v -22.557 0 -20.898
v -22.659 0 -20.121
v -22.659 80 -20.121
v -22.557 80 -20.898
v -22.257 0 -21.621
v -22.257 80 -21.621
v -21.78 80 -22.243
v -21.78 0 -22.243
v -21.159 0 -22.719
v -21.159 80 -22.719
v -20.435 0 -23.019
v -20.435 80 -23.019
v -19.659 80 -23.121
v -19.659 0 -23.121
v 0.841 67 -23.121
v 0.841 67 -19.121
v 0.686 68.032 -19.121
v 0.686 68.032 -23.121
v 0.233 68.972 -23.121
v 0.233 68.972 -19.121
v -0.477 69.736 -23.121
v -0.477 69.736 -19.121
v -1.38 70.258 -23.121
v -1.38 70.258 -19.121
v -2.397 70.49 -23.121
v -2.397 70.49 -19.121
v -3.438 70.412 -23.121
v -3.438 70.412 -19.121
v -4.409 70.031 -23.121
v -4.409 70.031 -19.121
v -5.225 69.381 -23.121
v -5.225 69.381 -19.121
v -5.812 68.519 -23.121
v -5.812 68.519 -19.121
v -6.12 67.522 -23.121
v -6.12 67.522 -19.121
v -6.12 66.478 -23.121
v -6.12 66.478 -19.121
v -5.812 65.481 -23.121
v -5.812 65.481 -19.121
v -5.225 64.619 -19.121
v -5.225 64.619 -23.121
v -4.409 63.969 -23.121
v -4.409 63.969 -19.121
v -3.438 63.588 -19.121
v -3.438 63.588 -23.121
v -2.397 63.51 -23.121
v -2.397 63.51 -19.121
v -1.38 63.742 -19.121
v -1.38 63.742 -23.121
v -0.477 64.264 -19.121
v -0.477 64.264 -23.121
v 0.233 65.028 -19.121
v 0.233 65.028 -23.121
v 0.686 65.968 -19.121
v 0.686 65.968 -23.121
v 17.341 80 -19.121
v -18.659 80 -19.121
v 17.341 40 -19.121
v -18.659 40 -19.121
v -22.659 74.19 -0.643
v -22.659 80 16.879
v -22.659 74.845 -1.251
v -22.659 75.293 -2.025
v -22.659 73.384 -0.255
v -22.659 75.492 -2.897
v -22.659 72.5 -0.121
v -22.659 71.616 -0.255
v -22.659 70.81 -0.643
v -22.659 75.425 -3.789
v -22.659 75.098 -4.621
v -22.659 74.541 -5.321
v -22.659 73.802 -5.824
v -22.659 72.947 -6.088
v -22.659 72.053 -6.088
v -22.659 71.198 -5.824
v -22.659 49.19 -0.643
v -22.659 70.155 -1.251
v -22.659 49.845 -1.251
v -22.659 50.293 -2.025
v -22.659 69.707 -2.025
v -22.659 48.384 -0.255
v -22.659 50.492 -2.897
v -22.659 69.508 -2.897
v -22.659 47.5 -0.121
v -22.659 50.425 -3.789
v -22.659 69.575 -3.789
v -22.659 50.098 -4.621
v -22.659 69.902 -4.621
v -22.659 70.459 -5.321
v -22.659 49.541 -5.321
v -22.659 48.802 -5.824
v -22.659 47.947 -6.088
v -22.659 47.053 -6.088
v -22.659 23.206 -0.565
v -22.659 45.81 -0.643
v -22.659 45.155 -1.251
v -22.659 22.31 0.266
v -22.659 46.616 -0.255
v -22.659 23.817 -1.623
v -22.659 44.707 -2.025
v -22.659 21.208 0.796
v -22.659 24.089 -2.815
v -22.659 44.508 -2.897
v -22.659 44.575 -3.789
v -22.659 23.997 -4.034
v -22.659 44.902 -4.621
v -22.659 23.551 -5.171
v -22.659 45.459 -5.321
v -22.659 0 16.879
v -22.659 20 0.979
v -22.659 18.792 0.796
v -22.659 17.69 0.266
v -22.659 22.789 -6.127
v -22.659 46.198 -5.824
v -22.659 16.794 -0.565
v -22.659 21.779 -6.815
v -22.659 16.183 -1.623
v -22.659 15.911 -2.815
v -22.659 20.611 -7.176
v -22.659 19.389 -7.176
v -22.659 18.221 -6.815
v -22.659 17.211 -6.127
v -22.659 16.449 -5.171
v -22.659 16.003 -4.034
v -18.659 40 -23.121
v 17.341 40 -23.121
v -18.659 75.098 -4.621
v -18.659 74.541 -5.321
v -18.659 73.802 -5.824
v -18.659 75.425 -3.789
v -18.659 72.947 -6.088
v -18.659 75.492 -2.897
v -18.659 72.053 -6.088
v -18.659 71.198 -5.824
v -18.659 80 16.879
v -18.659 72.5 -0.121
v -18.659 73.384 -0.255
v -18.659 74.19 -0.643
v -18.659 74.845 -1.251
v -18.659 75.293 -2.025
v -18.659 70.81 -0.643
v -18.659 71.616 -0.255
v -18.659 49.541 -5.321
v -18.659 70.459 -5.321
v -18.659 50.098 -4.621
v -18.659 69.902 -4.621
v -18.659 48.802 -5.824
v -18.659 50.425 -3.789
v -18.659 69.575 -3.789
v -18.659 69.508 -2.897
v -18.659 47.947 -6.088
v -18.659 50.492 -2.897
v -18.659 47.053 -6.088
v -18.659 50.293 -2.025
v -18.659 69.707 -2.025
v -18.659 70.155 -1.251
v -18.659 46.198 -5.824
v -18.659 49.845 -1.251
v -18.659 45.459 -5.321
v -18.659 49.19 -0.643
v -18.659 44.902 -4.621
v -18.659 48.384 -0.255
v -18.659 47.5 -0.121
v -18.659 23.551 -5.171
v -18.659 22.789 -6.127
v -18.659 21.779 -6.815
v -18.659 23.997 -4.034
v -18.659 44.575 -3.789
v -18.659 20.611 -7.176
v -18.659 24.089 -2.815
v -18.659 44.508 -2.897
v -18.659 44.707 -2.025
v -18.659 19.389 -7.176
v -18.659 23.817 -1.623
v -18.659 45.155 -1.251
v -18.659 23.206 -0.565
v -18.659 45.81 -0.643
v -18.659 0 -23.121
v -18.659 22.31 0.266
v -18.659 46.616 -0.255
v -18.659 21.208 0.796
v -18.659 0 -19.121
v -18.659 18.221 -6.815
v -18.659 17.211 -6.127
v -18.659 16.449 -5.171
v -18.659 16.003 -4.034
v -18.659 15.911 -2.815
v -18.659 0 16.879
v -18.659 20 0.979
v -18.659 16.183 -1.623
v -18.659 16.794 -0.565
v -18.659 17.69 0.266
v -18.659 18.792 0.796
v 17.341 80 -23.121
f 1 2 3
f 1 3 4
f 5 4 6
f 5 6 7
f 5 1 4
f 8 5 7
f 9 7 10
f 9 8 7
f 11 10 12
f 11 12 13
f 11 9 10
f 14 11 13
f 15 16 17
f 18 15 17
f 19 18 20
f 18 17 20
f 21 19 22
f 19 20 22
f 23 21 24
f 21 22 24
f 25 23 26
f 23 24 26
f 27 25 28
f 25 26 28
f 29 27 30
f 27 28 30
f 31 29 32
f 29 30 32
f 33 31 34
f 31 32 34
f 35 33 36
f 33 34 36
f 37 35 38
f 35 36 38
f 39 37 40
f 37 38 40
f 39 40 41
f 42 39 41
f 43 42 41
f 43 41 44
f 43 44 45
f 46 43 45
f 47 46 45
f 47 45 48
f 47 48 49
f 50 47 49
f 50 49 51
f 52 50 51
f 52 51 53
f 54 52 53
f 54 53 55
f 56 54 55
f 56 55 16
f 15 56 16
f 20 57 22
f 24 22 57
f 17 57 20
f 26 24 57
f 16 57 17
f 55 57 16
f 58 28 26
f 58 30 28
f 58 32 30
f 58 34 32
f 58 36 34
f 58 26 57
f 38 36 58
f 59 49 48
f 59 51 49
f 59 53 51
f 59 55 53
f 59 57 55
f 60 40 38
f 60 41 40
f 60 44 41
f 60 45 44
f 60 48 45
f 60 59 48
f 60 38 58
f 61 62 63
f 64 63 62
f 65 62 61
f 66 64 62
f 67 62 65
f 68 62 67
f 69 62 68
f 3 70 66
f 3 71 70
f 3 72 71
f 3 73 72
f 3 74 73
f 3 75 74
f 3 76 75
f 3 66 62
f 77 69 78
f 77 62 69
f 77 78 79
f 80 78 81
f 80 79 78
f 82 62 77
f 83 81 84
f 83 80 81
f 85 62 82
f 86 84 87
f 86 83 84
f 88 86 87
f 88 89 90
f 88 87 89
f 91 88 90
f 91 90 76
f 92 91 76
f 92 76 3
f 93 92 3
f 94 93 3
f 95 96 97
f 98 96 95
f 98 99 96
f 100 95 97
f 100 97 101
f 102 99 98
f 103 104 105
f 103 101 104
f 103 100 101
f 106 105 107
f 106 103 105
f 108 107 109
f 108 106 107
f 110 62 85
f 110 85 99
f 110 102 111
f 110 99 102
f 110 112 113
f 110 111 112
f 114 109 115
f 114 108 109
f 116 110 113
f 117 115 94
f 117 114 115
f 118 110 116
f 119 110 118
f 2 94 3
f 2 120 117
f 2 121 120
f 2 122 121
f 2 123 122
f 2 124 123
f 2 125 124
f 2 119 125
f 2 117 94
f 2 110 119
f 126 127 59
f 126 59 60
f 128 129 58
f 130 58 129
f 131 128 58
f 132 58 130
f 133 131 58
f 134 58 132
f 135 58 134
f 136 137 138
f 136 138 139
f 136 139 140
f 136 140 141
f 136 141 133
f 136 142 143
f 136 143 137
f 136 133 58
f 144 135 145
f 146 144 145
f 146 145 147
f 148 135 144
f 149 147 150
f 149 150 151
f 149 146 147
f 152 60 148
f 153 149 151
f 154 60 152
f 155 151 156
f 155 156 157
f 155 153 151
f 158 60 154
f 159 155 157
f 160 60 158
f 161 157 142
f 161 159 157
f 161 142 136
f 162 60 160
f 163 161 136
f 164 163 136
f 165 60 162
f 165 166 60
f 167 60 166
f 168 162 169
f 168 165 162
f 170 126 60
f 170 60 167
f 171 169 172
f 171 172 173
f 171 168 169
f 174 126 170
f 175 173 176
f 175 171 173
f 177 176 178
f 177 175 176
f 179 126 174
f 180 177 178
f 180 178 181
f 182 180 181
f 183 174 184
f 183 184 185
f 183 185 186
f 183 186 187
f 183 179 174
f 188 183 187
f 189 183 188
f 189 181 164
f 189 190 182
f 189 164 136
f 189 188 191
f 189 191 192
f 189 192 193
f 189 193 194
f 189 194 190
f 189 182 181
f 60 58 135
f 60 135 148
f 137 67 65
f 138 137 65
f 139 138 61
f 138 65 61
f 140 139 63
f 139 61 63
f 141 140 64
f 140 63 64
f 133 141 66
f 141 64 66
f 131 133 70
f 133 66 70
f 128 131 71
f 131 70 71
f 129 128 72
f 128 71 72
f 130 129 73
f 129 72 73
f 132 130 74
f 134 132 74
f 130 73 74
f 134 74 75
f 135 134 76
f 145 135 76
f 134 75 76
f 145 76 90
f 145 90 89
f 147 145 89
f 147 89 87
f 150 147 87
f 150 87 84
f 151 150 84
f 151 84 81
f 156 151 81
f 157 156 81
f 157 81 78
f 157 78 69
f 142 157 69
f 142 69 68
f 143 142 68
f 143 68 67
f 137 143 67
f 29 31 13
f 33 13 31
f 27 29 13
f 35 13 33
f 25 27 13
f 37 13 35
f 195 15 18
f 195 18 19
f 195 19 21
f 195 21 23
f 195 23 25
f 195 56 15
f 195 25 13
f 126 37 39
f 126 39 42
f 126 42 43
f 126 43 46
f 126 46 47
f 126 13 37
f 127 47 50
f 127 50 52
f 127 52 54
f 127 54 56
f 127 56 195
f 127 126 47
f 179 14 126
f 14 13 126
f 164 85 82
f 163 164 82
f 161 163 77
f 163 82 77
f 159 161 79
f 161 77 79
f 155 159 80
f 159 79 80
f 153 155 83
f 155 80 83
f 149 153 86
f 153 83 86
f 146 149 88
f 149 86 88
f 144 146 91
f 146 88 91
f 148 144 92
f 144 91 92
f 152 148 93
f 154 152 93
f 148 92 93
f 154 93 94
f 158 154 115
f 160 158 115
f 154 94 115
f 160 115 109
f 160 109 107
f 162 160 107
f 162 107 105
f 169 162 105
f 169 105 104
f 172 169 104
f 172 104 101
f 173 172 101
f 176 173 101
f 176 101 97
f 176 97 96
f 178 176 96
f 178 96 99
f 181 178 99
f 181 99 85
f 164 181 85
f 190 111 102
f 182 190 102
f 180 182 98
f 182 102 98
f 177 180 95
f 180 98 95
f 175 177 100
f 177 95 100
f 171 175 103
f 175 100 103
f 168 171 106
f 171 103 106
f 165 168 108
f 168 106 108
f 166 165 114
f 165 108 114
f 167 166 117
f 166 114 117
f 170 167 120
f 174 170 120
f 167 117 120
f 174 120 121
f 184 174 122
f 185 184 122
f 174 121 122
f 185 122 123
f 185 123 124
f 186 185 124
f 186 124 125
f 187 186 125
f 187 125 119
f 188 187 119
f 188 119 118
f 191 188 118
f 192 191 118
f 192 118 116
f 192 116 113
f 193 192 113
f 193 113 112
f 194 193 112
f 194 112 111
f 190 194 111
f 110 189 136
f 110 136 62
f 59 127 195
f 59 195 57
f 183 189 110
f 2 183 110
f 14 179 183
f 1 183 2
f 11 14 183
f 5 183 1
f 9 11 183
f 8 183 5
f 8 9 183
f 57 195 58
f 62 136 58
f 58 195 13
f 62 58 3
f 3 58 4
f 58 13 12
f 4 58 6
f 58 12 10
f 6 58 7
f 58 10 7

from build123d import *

# Parameters (mm, degrees)
EXTRUDE_THIN1_DEPTH   = 80
SKETCH5_R             = 4.1
SKETCH5_R_2           = 3
CUT_EXTRUDE2_DEPTH    = 10
SKETCH6_W             = 57.412547925
SKETCH6_H             = 40
CUT_EXTRUDE3_DEPTH    = 10
M8X1_0_TAPPED_HOLE3_D = 7


with BuildPart() as part:
    # Sketch1 → Extrude-Thin1 (new body)
    with BuildSketch(Plane(origin=(0, 0, 0), x_dir=(1, 0, 0), z_dir=(0, 1, 0))):
        with BuildLine():
            Line((-22.658959538, -16.878612717), (-22.658959538, 20.121387283))
            ThreePointArc((-22.658959538, 20.121387283), (-21.780279881, 22.242707627), (-19.658959538, 23.121387283))
            Line((-19.658959538, 23.121387283), (17.341040462, 23.121387283))
            Line((17.341040462, 23.121387283), (17.341040462, 19.121387283))
            Line((17.341040462, 19.121387283), (-18.658959538, 19.121387283))
            Line((-18.658959538, 19.121387283), (-18.658959538, -16.878612717))
            Line((-18.658959538, -16.878612717), (-22.658959538, -16.878612717))
        make_face()
    extrude(amount=EXTRUDE_THIN1_DEPTH)

    # Sketch5 → Cut-Extrude2 (cut)
    with BuildSketch(Plane.ZY.offset(22.658959538)):
        with Locations((-3.121387283, 20)):
            Circle(SKETCH5_R)
        with Locations((-3.121387283, 47.5)):
            Circle(SKETCH5_R_2)
        with Locations((-3.121387283, 72.5)):
            Circle(SKETCH5_R_2)
    extrude(amount=-CUT_EXTRUDE2_DEPTH, mode=Mode.SUBTRACT)

    # Sketch6 → Cut-Extrude3 (cut)
    with BuildSketch(Plane(origin=(0, 0, -23.121387283), x_dir=(-1, 0, 0), z_dir=(0, 0, -1))):
        with Locations((-10.047314424, 20)):
            Rectangle(SKETCH6_W, SKETCH6_H)
    extrude(amount=-CUT_EXTRUDE3_DEPTH, mode=Mode.SUBTRACT)

    # M8x1.0 Tapped Hole3 (through all)
    with Locations(Plane(origin=(0, 0, -23.121387283), x_dir=(-1, 0, 0), z_dir=(0, 0, -1))):
        with Locations((2.658959538, 67)):
            Hole(M8X1_0_TAPPED_HOLE3_D / 2)


solid = part.part
